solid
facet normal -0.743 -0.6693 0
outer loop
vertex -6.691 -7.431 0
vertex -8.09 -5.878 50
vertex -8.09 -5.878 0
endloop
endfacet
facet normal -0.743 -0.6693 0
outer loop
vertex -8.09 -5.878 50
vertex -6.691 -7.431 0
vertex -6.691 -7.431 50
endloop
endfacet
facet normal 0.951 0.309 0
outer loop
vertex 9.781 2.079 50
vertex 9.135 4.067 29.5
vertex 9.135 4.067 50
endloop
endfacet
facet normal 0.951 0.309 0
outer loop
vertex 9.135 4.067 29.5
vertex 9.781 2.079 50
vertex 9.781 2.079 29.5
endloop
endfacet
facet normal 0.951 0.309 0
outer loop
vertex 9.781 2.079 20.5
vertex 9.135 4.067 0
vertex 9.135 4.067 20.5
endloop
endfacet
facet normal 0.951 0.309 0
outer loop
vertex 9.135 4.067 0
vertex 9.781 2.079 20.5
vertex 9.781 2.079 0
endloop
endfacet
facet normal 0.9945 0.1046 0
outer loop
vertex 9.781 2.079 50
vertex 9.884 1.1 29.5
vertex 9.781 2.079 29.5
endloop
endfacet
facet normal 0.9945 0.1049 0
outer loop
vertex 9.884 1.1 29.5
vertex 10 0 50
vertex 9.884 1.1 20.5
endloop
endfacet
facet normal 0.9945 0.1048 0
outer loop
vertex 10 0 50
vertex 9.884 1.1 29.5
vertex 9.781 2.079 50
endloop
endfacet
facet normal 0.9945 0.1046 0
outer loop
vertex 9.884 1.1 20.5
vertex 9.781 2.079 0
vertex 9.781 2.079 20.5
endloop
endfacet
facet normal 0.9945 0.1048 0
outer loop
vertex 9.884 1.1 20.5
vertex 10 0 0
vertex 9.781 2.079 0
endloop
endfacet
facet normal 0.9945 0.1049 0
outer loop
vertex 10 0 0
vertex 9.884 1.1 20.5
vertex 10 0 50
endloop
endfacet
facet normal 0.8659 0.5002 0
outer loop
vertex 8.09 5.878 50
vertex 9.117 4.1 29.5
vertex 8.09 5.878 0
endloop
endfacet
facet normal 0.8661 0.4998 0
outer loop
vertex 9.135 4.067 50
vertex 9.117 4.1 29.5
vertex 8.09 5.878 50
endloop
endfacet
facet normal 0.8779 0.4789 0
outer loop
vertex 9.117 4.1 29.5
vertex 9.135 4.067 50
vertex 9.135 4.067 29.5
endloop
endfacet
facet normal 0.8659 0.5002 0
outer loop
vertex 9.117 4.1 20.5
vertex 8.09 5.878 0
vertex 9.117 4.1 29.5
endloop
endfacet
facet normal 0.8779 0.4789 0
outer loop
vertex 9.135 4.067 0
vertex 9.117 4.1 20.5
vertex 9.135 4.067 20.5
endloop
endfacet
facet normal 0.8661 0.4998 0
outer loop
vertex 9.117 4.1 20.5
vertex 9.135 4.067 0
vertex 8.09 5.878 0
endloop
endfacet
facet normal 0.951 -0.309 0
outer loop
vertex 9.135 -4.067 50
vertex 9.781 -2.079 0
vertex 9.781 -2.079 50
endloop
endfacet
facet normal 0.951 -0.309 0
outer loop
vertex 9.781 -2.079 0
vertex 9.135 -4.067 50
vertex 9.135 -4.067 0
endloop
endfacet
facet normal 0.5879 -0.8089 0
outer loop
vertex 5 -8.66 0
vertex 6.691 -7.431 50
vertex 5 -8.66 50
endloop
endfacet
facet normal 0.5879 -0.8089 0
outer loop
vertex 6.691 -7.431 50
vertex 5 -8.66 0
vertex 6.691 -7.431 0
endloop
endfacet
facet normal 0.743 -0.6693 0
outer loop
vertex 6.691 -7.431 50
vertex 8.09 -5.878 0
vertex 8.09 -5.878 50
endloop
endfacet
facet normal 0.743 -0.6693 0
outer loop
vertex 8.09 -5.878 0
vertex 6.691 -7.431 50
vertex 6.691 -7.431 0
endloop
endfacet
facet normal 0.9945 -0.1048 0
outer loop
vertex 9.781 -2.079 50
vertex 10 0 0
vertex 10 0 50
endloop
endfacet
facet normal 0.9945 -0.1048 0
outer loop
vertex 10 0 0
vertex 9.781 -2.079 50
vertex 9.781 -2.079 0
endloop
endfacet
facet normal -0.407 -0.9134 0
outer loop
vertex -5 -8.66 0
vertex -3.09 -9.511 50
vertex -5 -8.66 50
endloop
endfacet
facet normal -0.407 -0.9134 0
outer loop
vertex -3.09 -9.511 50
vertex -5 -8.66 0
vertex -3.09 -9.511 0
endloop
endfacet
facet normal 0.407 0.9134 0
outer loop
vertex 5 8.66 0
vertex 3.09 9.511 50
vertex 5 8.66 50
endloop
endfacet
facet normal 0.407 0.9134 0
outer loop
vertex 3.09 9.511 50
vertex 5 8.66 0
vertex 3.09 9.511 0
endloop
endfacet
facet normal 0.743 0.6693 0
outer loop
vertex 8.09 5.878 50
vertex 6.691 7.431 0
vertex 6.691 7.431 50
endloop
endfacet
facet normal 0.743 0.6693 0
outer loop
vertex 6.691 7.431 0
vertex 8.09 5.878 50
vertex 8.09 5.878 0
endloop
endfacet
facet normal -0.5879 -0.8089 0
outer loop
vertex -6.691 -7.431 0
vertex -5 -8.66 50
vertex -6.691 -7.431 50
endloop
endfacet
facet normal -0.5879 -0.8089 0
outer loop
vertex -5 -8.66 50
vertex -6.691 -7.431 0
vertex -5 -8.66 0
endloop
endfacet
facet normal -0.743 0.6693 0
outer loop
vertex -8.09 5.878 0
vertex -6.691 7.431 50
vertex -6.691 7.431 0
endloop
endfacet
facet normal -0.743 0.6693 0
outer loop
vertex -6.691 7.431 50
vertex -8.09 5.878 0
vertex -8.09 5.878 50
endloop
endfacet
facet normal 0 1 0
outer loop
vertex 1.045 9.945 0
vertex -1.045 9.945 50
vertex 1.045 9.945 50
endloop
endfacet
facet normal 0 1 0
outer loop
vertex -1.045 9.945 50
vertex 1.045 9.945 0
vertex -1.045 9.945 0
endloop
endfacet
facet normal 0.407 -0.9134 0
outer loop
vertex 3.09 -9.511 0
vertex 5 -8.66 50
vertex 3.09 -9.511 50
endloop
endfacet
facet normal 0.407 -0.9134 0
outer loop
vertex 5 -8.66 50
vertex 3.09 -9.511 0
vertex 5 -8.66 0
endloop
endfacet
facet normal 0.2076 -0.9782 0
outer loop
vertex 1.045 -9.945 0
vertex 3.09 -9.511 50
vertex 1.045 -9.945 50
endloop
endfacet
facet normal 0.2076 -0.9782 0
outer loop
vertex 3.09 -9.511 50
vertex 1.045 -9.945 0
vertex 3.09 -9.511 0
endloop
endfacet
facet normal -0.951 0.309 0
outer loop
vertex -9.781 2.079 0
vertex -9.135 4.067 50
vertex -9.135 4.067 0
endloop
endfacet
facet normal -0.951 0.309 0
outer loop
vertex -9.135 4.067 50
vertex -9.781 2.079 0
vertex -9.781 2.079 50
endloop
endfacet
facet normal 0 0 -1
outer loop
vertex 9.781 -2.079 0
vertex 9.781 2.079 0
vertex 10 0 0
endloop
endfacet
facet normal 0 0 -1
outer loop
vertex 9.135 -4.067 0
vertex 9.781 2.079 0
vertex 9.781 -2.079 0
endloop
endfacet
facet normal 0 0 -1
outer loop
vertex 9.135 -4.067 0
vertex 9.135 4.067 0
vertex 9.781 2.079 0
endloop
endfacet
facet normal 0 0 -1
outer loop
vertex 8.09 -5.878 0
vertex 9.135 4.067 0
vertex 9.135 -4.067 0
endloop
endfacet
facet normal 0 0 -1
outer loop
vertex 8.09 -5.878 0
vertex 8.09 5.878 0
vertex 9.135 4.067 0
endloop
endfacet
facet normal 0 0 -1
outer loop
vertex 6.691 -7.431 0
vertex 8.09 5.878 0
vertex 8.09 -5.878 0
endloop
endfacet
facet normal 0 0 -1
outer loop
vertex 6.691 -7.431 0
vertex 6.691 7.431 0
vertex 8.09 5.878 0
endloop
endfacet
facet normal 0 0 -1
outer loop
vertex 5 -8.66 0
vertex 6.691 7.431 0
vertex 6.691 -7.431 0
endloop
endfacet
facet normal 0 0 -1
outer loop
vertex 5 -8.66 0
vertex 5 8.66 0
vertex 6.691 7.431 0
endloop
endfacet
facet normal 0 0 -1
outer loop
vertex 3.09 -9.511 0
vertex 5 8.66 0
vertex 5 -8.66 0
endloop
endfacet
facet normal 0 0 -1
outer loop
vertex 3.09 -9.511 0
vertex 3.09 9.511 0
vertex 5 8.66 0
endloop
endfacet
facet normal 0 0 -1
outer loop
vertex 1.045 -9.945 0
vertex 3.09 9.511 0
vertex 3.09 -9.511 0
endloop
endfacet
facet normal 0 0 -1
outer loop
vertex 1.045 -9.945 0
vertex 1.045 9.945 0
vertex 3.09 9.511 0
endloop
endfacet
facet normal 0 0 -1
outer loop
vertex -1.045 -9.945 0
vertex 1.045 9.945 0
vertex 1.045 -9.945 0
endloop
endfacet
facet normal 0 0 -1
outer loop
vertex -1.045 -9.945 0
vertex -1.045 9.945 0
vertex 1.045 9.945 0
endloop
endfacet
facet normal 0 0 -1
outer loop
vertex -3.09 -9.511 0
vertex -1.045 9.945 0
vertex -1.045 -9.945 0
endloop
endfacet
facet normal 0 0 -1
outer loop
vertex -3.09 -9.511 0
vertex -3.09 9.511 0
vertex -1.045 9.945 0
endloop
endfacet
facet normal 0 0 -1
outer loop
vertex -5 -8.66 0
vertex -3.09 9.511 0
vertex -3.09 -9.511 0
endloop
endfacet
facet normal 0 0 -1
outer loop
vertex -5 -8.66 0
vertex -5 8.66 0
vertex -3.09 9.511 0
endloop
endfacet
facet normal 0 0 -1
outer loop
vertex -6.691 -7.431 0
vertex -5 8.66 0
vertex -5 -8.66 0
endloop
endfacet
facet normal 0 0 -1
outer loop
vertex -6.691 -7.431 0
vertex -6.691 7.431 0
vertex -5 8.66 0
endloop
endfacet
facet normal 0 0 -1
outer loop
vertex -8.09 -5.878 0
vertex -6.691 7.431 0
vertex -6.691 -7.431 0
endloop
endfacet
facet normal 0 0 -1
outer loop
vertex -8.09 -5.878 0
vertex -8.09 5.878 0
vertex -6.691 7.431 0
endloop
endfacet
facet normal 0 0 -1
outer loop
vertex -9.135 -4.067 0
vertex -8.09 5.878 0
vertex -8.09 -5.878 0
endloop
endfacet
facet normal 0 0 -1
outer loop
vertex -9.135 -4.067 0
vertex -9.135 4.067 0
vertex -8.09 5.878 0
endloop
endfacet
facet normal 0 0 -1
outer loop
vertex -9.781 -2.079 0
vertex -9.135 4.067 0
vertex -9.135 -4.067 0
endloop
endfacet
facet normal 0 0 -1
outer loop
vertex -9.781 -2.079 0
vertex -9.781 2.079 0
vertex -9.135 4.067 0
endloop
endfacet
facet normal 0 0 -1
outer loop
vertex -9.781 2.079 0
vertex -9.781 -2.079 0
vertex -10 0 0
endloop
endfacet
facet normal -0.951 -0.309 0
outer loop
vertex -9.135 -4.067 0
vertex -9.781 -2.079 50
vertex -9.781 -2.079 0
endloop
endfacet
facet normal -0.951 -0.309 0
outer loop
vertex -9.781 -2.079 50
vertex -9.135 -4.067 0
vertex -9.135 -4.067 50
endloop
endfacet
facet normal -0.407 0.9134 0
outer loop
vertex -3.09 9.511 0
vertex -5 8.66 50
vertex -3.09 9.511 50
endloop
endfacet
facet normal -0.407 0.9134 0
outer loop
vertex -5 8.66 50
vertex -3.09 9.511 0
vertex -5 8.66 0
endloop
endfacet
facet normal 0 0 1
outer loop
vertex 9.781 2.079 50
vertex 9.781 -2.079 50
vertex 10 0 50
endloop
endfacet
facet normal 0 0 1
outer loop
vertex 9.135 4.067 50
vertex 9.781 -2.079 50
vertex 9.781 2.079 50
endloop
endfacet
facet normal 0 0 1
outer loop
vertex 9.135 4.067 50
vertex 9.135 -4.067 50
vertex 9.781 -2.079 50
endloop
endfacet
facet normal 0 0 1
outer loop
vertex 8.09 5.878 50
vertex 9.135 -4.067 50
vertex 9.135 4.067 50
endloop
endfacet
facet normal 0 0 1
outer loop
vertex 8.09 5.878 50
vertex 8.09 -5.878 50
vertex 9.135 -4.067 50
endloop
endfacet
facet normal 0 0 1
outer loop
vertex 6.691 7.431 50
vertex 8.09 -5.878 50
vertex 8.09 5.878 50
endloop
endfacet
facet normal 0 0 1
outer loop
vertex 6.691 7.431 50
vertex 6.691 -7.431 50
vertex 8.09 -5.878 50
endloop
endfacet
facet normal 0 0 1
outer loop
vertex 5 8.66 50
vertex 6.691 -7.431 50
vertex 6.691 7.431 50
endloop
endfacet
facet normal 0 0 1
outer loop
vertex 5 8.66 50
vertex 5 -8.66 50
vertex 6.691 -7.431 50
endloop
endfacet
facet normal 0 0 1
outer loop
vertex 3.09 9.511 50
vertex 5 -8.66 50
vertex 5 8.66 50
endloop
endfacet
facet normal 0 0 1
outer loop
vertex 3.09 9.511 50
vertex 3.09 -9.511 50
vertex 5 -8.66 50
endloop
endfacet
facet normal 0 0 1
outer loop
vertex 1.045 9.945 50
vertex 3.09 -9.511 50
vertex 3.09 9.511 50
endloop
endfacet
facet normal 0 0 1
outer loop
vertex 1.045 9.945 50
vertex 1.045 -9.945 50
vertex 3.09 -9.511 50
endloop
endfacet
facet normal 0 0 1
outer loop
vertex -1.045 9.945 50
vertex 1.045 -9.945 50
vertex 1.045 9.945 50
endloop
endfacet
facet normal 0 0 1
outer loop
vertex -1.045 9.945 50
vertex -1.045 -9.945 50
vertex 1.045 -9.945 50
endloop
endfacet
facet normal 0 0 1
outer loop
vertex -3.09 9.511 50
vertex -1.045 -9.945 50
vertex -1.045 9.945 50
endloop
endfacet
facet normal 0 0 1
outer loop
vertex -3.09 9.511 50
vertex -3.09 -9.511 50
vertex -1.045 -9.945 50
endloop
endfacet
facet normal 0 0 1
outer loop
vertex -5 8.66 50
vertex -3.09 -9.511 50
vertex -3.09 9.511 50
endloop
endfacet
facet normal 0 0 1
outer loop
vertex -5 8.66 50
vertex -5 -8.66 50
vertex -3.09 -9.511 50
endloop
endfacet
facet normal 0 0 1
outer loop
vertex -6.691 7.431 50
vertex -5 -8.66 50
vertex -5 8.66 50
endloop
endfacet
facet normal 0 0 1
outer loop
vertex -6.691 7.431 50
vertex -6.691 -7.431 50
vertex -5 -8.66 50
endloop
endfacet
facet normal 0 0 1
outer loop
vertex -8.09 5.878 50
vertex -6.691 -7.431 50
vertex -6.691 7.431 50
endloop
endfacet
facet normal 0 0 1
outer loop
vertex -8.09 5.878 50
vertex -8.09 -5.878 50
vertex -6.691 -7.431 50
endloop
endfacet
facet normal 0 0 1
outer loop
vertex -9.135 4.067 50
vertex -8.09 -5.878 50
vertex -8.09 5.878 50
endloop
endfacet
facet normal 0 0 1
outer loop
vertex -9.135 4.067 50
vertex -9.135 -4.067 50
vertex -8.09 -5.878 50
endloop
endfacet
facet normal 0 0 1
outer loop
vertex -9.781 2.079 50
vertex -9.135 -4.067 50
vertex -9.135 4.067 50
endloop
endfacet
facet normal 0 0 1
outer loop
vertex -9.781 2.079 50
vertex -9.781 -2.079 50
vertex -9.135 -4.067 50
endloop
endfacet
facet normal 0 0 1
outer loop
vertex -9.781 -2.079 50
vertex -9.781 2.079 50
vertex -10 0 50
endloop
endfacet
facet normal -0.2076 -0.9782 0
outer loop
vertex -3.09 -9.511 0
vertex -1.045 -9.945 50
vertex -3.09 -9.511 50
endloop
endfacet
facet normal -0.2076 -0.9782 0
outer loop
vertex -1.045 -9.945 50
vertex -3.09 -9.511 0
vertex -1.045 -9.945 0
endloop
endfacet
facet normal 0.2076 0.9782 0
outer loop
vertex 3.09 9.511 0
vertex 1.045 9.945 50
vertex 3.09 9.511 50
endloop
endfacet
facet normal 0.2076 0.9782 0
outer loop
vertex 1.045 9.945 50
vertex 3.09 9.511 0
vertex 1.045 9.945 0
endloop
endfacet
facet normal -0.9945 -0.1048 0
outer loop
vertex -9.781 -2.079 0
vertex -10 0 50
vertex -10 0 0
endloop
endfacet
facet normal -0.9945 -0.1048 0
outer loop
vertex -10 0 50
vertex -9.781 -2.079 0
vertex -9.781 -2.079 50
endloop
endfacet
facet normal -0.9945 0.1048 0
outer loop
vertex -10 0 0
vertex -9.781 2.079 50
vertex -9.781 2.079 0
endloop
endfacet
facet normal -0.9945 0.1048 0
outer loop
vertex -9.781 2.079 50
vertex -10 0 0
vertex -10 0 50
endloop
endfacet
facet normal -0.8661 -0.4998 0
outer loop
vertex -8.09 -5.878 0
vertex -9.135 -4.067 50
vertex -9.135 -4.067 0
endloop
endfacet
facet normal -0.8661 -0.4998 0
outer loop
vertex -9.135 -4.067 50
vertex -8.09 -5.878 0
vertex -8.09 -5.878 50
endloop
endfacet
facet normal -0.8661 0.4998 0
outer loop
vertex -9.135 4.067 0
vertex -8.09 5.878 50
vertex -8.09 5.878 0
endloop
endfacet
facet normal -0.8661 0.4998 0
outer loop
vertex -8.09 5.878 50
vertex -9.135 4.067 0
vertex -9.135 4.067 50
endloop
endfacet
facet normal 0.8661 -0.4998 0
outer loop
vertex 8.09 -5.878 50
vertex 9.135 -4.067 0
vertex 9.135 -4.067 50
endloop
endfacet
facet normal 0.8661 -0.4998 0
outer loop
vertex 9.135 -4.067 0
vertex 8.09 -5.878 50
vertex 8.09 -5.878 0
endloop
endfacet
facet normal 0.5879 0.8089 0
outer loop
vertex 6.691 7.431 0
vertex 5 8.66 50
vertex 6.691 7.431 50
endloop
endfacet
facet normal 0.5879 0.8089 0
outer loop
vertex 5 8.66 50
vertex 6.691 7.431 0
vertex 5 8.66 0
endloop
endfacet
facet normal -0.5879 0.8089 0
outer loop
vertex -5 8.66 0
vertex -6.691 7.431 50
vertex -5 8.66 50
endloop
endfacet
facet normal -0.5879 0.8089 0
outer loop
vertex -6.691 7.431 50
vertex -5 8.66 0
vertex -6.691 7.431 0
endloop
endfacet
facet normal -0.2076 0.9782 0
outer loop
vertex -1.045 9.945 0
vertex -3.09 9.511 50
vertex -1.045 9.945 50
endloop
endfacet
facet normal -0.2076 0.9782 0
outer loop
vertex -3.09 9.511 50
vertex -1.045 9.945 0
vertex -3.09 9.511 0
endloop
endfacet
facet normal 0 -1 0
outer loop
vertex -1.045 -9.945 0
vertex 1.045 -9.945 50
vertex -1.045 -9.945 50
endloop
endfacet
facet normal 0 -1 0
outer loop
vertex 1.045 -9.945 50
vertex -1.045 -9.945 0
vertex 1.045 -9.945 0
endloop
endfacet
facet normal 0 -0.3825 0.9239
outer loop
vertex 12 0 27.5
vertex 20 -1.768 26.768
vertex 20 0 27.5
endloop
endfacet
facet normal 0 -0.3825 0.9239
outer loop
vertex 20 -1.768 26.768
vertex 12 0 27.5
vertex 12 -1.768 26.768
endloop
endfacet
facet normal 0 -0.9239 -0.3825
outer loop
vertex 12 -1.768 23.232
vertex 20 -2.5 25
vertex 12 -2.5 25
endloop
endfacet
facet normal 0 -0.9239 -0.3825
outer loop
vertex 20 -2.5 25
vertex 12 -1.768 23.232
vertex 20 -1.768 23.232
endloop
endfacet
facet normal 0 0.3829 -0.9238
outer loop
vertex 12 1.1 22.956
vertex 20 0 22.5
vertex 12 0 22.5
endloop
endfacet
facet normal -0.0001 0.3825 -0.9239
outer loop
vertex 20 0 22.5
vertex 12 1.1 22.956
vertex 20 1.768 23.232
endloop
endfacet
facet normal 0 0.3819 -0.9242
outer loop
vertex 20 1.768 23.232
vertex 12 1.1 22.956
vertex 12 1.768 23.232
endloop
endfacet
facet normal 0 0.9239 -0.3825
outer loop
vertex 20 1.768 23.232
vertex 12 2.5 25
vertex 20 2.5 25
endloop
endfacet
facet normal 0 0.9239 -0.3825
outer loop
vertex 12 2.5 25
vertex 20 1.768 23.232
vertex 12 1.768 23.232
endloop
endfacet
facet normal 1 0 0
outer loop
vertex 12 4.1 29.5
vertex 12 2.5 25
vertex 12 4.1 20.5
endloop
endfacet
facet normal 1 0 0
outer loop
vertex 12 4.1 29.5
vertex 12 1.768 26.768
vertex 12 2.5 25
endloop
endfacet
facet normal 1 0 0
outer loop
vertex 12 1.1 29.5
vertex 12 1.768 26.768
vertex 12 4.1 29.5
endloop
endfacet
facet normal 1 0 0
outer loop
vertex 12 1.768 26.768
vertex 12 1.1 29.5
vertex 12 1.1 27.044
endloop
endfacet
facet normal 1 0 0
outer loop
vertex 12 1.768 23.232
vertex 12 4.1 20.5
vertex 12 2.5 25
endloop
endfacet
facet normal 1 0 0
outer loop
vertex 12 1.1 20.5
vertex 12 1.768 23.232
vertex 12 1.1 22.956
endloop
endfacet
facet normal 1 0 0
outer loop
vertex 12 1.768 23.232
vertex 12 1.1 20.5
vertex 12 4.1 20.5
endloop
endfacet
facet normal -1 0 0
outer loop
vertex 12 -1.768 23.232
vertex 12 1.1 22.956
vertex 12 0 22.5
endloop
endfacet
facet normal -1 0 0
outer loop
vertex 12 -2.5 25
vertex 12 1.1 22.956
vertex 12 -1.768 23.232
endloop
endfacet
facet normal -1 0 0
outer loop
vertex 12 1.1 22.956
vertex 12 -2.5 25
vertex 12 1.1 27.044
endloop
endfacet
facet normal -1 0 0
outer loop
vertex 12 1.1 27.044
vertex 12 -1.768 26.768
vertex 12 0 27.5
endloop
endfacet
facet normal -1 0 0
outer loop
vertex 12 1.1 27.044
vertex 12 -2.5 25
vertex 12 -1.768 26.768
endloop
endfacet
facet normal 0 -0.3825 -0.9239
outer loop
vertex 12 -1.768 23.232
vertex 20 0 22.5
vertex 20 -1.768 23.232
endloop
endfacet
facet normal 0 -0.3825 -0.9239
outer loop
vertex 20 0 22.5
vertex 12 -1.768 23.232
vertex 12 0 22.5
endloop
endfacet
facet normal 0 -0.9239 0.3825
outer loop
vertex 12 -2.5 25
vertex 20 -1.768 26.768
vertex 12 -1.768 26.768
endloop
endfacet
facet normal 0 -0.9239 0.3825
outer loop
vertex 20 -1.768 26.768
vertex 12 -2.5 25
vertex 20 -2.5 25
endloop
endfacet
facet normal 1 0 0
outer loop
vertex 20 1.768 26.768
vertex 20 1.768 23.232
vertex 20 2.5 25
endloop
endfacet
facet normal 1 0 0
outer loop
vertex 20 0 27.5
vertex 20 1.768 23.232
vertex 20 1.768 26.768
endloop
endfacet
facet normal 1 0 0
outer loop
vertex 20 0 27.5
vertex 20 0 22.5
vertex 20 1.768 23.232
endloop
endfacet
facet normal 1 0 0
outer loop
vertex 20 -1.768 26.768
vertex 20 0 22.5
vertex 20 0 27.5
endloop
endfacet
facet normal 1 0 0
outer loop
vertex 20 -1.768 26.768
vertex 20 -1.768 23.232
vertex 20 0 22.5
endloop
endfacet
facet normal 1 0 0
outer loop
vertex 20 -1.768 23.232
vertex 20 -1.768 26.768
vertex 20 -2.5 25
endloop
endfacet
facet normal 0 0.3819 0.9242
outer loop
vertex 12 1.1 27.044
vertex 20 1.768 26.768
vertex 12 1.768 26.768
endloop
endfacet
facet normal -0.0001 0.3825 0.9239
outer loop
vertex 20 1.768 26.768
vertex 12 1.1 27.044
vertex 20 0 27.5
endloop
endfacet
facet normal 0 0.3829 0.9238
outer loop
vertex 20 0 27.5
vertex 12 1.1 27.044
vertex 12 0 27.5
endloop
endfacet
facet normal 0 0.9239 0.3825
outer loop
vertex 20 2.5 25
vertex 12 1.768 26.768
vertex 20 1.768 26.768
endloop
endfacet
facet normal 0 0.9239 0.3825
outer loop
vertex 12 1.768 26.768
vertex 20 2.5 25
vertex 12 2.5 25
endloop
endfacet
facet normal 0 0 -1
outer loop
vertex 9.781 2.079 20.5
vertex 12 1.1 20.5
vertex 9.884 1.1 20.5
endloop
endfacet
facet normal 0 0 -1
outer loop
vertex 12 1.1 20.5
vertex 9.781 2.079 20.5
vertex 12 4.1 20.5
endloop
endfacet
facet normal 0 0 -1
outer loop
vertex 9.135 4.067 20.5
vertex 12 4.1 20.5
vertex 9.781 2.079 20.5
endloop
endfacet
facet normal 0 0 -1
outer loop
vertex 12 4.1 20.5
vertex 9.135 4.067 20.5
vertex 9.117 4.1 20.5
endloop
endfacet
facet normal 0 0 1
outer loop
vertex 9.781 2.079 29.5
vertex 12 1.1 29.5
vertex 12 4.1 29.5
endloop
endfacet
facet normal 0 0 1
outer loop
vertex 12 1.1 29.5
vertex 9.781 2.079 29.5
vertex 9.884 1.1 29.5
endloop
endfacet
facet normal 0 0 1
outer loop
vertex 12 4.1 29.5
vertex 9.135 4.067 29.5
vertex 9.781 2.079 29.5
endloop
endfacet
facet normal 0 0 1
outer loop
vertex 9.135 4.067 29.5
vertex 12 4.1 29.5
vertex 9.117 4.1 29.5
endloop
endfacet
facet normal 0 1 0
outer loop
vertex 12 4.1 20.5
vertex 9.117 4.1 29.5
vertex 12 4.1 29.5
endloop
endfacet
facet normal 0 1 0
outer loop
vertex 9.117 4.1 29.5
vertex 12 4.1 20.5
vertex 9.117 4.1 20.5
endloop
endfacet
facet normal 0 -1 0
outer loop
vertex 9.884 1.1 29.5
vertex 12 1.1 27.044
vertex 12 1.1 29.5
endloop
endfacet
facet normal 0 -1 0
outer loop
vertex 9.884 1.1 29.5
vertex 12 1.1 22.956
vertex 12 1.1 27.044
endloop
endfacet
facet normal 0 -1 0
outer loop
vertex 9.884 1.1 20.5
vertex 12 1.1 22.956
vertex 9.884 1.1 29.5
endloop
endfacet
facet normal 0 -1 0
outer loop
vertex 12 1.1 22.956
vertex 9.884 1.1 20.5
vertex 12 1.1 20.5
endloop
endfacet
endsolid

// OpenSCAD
// Parameters
cylinder_diameter = 20;
cylinder_height = 50;
set_screw_diameter = 5;
set_screw_offset = 12; // Distance from cylinder center to set screw center
set_screw_depth = 8;  // How deep the set screw hole goes

// Create the cylinder
cylinder(h = cylinder_height, d = cylinder_diameter);

// Create the set screw hole (using difference)
translate([set_screw_offset, 0, cylinder_height/2]) { // Position the hole
  rotate([0, 90, 0]) { // Rotate for correct orientation
    cylinder(h = set_screw_depth, d = set_screw_diameter);
  }
}

// Subtract the set screw hole from the cylinder
difference() {
  cylinder(h = cylinder_height, d = cylinder_diameter);

  translate([set_screw_offset, 0, cylinder_height/2]) {
    rotate([0, 90, 0]) {
      cylinder(h = set_screw_depth + 1, d = set_screw_diameter + 0.1); // Add a little extra for clean subtraction. Important!
    }
  }
}


// Optional: Add a small flat spot for the set screw to grip better
set_screw_flat_width = 3;
translate([set_screw_offset, 0, cylinder_height/2]) {
  rotate([0, 90, 0]) {
    translate([0, set_screw_diameter/2 + 0.1, -set_screw_flat_width/2]) { // Position flat
      cube([set_screw_depth + 1, set_screw_flat_width, set_screw_flat_width], center=true); // Create the flat
    }
  }
}

difference() {
  cylinder(h = cylinder_height, d = cylinder_diameter);

  translate([set_screw_offset, 0, cylinder_height/2]) {
    rotate([0, 90, 0]) {
      cylinder(h = set_screw_depth + 1, d = set_screw_diameter + 0.1); // Add a little extra for clean subtraction. Important!
    }
  }

    translate([set_screw_offset, 0, cylinder_height/2]) {
    rotate([0, 90, 0]) {
      translate([0, set_screw_diameter/2 + 0.1, -set_screw_flat_width/2]) { // Position flat
        cube([set_screw_depth + 1, set_screw_flat_width, set_screw_flat_width], center=true); // Create the flat
      }
    }
  }
}
